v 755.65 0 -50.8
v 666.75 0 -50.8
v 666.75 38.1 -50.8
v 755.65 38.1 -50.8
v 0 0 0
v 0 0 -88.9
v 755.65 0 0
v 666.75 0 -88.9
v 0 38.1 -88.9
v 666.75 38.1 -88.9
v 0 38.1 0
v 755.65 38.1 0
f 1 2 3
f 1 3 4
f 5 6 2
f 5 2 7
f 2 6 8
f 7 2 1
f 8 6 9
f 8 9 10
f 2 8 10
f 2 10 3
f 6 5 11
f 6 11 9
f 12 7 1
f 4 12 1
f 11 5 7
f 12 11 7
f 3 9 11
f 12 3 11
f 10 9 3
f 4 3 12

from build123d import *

# Parameters (mm, degrees)
SKETCH1_W           = 755.65
SKETCH1_H           = 88.9
BOSS_EXTRUDE1_DEPTH = 38.1
SKETCH2_W           = 88.9
SKETCH2_H           = 38.1
CUT_EXTRUDE1_DEPTH  = 39.1


with BuildPart() as part:
    # Sketch1 → Boss-Extrude1 (new body)
    with BuildSketch(Plane(origin=(0, 0, 0), x_dir=(1, 0, 0), z_dir=(0, 1, 0))):
        with Locations((377.825, 44.45)):
            Rectangle(SKETCH1_W, SKETCH1_H)
    extrude(amount=BOSS_EXTRUDE1_DEPTH)

    # Sketch2 → Cut-Extrude1 (cut, through all)
    with BuildSketch(Plane.XZ):
        with Locations((711.2, -69.85)):
            Rectangle(SKETCH2_W, SKETCH2_H)
    extrude(amount=-CUT_EXTRUDE1_DEPTH, mode=Mode.SUBTRACT)


solid = part.part
